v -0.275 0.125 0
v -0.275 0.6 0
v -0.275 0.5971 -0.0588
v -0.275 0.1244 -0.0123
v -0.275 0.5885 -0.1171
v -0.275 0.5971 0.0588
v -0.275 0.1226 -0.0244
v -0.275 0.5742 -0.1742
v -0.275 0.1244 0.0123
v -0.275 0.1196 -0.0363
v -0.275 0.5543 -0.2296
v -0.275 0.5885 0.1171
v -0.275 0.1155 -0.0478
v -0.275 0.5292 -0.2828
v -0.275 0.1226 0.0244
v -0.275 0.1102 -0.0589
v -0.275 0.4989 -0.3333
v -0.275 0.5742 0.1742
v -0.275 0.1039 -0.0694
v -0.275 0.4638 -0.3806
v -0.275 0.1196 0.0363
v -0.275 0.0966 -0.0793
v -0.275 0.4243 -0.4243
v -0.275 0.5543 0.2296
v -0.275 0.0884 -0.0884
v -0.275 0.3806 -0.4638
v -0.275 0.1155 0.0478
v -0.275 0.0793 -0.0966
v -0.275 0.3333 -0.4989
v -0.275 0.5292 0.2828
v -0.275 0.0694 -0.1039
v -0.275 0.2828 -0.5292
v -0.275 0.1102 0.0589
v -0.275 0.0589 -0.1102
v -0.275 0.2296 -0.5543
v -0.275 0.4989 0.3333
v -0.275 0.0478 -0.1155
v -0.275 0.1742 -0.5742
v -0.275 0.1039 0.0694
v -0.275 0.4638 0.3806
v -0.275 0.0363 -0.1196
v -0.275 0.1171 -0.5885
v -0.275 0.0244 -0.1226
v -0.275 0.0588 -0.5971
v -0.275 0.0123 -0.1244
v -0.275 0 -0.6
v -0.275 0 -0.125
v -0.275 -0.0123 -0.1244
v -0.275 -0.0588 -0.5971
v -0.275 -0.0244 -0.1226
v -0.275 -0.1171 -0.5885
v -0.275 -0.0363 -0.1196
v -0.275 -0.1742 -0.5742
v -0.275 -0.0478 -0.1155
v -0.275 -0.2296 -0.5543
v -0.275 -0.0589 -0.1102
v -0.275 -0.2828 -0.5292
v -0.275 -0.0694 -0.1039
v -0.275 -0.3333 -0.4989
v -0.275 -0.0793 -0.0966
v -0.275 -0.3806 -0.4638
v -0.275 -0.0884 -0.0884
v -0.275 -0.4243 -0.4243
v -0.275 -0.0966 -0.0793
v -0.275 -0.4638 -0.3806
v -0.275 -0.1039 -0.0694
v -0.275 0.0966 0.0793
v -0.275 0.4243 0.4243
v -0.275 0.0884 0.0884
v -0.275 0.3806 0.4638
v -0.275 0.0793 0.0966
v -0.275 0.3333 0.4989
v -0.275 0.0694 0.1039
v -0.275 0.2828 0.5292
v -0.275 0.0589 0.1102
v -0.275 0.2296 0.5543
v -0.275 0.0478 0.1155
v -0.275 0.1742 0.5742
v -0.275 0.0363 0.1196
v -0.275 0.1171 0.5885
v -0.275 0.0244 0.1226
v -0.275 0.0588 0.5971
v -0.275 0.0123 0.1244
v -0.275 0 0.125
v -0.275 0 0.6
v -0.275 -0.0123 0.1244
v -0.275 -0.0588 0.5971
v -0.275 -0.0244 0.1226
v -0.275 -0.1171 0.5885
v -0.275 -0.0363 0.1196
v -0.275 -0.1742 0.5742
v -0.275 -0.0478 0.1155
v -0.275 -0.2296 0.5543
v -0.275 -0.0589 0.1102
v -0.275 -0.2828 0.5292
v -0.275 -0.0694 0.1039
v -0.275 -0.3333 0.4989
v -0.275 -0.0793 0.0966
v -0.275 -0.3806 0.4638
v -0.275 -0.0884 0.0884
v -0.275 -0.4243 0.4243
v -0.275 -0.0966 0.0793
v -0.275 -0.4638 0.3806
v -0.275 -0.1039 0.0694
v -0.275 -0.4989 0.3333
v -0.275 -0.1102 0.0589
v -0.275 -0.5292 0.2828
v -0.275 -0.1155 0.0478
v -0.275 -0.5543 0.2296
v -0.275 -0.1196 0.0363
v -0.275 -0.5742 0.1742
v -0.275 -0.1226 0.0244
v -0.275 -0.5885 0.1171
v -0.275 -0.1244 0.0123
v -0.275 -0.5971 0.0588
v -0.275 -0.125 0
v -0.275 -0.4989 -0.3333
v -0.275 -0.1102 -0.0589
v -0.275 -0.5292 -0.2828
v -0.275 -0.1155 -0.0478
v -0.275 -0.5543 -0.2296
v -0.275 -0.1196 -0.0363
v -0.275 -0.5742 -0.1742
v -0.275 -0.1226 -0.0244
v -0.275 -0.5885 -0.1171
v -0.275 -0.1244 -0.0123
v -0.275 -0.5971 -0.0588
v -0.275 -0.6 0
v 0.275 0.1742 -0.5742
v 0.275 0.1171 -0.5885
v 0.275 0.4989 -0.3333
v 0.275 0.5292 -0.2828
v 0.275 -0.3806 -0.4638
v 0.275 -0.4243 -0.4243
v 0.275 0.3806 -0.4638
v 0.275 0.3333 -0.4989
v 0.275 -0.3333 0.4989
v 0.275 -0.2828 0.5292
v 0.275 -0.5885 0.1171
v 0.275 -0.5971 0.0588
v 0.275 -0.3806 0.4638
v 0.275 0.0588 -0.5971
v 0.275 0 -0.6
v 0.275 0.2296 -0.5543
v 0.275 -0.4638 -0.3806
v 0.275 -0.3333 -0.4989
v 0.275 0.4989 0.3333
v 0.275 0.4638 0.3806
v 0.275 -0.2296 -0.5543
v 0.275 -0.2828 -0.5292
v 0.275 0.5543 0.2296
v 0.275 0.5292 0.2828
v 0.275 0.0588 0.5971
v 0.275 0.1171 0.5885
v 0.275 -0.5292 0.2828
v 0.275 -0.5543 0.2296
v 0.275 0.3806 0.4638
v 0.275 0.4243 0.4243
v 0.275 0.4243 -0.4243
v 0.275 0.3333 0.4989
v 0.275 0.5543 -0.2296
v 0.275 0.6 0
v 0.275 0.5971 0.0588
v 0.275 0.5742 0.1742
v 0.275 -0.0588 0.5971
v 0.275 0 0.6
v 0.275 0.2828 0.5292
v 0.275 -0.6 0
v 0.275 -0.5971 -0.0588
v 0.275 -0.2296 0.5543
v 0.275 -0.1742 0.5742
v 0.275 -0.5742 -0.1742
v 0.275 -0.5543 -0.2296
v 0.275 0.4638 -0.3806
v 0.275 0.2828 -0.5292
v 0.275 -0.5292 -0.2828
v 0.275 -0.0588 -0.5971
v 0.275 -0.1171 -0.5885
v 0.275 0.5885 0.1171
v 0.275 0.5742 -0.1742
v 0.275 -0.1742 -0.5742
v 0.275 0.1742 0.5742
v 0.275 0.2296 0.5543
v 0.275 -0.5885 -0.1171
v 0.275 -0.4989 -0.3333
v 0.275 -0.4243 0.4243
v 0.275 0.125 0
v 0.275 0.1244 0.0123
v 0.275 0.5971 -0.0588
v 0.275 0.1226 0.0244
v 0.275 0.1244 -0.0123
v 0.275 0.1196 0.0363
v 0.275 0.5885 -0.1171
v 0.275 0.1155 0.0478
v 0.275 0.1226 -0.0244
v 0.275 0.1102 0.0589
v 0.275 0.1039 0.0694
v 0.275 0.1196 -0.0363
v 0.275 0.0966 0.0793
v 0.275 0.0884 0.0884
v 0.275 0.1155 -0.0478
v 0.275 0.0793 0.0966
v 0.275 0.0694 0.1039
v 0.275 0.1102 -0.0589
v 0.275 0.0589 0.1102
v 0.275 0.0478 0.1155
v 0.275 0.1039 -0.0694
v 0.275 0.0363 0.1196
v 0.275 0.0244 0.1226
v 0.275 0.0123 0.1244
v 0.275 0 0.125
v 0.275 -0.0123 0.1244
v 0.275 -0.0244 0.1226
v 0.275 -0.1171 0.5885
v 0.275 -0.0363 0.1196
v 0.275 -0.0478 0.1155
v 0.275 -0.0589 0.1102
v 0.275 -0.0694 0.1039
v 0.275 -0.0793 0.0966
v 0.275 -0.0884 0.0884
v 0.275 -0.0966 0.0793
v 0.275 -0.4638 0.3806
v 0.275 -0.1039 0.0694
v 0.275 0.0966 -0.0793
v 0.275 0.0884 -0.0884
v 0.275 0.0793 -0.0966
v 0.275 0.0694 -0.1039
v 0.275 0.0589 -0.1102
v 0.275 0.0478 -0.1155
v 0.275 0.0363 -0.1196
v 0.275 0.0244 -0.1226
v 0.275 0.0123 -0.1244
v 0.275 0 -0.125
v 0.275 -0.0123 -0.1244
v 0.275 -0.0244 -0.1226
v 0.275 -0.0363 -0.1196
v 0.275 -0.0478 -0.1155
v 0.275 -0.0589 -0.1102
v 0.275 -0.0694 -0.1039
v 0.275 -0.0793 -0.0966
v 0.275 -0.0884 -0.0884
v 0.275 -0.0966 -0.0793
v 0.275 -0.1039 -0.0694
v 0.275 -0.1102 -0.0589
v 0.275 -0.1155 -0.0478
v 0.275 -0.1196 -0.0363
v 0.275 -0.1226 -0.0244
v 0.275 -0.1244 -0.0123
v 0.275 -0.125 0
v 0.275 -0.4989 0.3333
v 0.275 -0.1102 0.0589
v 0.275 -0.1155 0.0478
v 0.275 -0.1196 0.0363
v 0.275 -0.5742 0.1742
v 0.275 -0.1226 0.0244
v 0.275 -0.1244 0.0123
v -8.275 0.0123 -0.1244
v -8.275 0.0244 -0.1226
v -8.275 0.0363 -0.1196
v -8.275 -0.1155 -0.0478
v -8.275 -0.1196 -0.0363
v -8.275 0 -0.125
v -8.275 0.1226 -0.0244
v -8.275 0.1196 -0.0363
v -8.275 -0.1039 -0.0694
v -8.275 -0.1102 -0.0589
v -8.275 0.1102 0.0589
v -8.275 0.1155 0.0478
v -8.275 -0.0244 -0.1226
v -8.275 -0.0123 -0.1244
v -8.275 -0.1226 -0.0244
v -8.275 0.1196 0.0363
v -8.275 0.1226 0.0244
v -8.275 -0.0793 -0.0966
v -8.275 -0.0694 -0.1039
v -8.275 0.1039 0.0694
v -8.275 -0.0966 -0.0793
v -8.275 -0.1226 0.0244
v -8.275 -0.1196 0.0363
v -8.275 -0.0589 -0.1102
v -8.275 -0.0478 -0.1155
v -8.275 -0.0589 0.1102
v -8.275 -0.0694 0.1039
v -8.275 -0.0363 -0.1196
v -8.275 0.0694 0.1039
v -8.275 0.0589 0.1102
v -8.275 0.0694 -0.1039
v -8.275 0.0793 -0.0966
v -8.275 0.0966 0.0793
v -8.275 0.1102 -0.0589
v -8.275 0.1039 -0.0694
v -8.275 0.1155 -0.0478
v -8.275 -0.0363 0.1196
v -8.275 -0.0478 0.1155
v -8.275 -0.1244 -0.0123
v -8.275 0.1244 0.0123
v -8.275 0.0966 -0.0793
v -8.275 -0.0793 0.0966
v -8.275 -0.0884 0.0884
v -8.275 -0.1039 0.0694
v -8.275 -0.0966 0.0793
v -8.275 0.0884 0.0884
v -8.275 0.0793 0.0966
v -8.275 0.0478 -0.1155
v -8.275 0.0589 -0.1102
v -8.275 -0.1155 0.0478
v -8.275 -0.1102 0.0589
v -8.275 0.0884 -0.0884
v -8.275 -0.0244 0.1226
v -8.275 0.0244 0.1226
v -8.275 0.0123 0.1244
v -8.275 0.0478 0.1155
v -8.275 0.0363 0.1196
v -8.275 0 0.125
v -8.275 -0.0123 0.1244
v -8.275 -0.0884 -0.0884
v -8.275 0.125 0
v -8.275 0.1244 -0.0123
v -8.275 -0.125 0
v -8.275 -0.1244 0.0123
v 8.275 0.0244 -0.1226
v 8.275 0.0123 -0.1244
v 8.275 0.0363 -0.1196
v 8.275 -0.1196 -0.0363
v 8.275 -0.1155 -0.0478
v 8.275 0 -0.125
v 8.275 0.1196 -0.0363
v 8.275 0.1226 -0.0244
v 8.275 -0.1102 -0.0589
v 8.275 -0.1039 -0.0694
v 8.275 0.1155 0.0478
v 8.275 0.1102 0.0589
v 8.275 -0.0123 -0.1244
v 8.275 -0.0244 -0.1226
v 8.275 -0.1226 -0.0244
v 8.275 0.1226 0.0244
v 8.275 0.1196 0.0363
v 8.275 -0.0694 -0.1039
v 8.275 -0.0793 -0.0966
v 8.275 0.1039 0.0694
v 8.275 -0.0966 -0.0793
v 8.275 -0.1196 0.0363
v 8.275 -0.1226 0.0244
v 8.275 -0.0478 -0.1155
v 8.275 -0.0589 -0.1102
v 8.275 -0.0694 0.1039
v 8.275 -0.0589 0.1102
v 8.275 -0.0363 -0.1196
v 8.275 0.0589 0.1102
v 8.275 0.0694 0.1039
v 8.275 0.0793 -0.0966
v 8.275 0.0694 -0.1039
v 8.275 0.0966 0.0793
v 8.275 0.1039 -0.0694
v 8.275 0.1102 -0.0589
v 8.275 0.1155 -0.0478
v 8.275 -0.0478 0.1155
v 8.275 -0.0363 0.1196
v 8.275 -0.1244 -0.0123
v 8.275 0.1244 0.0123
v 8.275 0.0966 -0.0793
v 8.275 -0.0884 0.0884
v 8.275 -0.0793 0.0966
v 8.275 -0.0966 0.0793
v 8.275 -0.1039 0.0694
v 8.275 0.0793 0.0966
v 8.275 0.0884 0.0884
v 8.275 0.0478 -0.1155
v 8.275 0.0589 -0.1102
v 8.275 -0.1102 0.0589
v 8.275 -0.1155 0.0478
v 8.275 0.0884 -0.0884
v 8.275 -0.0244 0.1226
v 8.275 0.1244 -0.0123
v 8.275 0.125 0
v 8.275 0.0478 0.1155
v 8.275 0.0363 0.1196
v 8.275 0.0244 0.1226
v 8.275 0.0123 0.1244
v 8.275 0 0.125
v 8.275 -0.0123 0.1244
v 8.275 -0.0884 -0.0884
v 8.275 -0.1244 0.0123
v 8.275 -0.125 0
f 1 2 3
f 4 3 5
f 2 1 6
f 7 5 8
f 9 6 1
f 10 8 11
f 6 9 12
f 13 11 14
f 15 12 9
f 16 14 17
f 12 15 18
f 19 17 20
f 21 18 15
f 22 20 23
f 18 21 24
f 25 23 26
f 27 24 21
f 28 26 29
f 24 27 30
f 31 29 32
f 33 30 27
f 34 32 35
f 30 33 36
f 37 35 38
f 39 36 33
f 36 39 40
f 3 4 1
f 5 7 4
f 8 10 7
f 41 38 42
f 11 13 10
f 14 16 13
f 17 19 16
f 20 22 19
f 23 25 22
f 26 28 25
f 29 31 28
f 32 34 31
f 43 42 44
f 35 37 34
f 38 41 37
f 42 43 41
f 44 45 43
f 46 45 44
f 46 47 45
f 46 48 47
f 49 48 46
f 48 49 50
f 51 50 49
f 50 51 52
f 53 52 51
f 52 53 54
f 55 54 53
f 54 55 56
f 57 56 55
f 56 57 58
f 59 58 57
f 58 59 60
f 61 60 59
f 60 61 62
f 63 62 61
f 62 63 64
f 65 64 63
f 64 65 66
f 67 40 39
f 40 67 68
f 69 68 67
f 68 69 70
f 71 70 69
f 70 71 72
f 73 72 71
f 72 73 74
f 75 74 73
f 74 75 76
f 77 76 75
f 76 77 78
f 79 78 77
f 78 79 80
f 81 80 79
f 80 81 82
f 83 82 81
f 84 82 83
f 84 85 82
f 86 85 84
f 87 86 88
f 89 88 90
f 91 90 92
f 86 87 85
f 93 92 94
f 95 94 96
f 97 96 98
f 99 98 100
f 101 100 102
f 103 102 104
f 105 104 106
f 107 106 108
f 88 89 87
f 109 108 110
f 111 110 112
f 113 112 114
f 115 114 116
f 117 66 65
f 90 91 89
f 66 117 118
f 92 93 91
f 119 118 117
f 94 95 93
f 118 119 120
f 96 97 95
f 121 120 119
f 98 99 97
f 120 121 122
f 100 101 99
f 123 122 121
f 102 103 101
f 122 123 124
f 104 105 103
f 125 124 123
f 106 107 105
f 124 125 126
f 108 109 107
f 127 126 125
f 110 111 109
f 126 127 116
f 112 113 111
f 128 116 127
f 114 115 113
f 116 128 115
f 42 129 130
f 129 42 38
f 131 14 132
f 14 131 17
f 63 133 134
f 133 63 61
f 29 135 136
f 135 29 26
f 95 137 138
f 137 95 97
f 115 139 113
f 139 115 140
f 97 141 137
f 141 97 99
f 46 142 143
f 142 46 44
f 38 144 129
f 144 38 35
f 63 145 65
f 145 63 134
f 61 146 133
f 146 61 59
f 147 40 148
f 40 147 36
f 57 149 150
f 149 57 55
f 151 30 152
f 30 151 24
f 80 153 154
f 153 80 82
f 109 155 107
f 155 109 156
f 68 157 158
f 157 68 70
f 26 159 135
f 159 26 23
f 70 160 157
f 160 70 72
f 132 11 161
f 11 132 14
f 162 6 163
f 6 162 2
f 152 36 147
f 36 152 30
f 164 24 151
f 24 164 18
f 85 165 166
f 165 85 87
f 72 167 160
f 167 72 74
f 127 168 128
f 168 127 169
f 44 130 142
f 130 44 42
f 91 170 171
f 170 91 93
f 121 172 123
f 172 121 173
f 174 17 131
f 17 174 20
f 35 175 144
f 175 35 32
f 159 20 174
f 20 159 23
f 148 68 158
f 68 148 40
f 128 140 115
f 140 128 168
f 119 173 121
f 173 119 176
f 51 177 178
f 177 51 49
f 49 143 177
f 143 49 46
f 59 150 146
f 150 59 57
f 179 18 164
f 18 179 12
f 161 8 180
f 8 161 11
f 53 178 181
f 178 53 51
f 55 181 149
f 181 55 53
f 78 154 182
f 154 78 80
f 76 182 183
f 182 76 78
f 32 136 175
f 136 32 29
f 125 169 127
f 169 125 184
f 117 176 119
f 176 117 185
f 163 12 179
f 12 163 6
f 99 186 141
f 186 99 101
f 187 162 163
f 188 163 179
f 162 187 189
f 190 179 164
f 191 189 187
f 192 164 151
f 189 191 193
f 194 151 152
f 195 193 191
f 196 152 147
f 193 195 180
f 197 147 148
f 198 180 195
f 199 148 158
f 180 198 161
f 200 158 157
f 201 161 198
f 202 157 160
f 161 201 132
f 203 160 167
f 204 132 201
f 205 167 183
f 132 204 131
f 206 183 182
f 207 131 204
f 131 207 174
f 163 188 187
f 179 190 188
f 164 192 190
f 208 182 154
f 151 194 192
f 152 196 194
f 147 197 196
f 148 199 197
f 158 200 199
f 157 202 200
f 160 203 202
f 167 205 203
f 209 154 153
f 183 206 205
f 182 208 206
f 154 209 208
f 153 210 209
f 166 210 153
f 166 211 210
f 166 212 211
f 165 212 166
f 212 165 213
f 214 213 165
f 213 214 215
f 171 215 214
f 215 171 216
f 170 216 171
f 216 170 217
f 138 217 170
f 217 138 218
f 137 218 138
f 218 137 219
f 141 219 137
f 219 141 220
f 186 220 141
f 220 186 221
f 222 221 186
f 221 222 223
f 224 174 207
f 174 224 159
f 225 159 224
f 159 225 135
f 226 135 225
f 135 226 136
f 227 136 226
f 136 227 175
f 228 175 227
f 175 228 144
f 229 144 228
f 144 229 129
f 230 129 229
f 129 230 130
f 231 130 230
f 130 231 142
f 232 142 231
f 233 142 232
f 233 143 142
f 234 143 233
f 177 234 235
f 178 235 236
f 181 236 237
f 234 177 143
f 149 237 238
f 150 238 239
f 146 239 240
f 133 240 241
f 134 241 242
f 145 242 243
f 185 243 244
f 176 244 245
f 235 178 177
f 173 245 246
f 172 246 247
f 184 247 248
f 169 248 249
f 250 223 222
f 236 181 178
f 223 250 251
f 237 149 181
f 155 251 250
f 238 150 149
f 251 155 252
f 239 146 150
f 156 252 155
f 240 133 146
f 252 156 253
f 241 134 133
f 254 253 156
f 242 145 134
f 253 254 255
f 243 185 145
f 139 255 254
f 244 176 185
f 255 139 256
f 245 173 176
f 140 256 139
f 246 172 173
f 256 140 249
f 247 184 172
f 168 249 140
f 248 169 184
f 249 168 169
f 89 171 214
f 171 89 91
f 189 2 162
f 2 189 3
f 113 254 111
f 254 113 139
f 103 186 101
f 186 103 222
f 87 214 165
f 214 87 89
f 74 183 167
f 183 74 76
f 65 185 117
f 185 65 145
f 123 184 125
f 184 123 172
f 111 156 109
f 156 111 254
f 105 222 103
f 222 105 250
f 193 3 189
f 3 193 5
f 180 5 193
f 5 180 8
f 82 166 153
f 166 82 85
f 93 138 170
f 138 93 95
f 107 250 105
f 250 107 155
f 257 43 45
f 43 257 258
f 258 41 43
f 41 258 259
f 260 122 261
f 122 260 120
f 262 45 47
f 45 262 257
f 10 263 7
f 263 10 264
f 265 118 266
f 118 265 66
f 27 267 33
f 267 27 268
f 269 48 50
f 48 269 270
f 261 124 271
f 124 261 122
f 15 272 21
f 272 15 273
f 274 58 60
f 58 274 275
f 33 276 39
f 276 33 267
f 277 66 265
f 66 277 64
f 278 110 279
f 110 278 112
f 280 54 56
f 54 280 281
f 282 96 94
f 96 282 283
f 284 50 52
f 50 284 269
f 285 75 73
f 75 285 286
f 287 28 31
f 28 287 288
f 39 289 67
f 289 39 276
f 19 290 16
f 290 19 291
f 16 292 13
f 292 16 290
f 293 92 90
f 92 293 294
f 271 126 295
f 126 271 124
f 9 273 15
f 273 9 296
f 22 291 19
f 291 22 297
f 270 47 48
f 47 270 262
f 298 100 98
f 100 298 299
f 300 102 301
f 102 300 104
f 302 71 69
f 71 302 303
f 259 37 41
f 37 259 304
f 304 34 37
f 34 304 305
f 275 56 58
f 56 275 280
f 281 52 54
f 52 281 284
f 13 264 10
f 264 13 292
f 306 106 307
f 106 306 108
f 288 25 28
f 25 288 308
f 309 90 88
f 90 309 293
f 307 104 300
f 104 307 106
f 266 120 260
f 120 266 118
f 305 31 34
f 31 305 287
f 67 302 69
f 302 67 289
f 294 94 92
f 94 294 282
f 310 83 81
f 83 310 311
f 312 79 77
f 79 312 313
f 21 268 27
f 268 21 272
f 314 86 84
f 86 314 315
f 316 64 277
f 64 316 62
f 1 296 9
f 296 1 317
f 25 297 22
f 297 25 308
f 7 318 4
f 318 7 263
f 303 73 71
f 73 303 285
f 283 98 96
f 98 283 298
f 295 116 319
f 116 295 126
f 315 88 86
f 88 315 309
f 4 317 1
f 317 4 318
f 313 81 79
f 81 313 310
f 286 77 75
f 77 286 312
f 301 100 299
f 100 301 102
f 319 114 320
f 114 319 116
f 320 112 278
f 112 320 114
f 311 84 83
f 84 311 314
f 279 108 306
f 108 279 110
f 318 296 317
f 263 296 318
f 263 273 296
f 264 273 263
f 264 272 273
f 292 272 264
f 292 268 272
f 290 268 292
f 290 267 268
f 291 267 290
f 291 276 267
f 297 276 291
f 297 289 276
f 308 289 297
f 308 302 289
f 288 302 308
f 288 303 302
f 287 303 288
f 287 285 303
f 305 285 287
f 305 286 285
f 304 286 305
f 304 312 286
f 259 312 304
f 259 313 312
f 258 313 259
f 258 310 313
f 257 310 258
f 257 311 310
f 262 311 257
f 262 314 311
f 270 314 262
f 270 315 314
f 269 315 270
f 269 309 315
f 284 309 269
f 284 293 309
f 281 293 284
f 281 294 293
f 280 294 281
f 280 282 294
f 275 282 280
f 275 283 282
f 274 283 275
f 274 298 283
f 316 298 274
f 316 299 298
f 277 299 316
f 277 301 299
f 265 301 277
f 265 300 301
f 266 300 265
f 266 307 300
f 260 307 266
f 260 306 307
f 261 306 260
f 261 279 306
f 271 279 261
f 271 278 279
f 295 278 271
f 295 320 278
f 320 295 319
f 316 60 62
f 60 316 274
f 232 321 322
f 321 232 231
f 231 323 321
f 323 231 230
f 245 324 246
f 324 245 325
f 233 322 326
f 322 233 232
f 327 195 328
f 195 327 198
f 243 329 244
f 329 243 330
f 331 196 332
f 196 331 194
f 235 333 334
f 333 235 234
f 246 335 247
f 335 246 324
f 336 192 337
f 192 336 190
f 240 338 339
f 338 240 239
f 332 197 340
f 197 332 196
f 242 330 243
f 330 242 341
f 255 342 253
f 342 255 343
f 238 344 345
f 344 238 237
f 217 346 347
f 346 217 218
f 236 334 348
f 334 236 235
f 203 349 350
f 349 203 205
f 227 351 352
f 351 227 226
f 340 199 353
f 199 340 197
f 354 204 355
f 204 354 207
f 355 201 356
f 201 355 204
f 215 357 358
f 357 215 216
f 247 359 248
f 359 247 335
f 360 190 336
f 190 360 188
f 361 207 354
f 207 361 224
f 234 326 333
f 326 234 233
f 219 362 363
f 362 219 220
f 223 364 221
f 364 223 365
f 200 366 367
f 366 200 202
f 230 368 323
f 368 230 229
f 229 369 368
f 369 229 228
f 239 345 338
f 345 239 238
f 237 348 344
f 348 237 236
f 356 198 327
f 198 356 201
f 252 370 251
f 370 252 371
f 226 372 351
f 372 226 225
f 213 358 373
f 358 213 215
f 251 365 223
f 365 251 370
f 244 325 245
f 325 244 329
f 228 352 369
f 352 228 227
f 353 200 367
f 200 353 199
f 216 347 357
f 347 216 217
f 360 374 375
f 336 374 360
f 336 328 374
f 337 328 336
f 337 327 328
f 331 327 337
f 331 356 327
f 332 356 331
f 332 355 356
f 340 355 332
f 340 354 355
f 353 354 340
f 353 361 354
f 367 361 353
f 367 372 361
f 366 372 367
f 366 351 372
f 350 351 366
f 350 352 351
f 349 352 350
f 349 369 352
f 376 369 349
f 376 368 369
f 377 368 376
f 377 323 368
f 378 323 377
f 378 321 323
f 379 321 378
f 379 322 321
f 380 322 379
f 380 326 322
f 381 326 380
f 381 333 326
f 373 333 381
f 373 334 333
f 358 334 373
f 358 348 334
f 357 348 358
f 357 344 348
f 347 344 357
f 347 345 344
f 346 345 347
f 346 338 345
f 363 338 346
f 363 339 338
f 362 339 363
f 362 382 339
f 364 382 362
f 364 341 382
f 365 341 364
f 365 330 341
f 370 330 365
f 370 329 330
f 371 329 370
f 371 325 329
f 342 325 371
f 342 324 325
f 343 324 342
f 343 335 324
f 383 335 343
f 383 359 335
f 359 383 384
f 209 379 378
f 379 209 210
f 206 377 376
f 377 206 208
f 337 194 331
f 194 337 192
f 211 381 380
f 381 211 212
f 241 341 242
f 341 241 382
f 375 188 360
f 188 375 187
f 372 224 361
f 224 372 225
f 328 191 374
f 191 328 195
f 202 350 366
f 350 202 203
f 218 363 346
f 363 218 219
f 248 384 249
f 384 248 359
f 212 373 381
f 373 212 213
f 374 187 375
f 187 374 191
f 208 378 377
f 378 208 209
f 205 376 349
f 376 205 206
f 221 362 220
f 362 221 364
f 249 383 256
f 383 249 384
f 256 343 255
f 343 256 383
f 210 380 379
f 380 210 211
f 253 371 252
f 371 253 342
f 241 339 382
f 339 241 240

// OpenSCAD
$fn = 64;

module axial_component(body_length=0.55, body_d=1.2, lead_d=0.25, lead_length=8) {
    union() {
        // Body centered at origin along X axis
        rotate([0,90,0])
            cylinder(h=body_length, d=body_d, center=true);

        // Leads along X axis, symmetric
        translate([-(body_length/2 + lead_length/2),0,0])
            rotate([0,90,0])
                cylinder(h=lead_length, d=lead_d, center=true);

        translate([(body_length/2 + lead_length/2),0,0])
            rotate([0,90,0])
                cylinder(h=lead_length, d=lead_d, center=true);
    }
}

// Top-level call
axial_component(body_length=0.55);
